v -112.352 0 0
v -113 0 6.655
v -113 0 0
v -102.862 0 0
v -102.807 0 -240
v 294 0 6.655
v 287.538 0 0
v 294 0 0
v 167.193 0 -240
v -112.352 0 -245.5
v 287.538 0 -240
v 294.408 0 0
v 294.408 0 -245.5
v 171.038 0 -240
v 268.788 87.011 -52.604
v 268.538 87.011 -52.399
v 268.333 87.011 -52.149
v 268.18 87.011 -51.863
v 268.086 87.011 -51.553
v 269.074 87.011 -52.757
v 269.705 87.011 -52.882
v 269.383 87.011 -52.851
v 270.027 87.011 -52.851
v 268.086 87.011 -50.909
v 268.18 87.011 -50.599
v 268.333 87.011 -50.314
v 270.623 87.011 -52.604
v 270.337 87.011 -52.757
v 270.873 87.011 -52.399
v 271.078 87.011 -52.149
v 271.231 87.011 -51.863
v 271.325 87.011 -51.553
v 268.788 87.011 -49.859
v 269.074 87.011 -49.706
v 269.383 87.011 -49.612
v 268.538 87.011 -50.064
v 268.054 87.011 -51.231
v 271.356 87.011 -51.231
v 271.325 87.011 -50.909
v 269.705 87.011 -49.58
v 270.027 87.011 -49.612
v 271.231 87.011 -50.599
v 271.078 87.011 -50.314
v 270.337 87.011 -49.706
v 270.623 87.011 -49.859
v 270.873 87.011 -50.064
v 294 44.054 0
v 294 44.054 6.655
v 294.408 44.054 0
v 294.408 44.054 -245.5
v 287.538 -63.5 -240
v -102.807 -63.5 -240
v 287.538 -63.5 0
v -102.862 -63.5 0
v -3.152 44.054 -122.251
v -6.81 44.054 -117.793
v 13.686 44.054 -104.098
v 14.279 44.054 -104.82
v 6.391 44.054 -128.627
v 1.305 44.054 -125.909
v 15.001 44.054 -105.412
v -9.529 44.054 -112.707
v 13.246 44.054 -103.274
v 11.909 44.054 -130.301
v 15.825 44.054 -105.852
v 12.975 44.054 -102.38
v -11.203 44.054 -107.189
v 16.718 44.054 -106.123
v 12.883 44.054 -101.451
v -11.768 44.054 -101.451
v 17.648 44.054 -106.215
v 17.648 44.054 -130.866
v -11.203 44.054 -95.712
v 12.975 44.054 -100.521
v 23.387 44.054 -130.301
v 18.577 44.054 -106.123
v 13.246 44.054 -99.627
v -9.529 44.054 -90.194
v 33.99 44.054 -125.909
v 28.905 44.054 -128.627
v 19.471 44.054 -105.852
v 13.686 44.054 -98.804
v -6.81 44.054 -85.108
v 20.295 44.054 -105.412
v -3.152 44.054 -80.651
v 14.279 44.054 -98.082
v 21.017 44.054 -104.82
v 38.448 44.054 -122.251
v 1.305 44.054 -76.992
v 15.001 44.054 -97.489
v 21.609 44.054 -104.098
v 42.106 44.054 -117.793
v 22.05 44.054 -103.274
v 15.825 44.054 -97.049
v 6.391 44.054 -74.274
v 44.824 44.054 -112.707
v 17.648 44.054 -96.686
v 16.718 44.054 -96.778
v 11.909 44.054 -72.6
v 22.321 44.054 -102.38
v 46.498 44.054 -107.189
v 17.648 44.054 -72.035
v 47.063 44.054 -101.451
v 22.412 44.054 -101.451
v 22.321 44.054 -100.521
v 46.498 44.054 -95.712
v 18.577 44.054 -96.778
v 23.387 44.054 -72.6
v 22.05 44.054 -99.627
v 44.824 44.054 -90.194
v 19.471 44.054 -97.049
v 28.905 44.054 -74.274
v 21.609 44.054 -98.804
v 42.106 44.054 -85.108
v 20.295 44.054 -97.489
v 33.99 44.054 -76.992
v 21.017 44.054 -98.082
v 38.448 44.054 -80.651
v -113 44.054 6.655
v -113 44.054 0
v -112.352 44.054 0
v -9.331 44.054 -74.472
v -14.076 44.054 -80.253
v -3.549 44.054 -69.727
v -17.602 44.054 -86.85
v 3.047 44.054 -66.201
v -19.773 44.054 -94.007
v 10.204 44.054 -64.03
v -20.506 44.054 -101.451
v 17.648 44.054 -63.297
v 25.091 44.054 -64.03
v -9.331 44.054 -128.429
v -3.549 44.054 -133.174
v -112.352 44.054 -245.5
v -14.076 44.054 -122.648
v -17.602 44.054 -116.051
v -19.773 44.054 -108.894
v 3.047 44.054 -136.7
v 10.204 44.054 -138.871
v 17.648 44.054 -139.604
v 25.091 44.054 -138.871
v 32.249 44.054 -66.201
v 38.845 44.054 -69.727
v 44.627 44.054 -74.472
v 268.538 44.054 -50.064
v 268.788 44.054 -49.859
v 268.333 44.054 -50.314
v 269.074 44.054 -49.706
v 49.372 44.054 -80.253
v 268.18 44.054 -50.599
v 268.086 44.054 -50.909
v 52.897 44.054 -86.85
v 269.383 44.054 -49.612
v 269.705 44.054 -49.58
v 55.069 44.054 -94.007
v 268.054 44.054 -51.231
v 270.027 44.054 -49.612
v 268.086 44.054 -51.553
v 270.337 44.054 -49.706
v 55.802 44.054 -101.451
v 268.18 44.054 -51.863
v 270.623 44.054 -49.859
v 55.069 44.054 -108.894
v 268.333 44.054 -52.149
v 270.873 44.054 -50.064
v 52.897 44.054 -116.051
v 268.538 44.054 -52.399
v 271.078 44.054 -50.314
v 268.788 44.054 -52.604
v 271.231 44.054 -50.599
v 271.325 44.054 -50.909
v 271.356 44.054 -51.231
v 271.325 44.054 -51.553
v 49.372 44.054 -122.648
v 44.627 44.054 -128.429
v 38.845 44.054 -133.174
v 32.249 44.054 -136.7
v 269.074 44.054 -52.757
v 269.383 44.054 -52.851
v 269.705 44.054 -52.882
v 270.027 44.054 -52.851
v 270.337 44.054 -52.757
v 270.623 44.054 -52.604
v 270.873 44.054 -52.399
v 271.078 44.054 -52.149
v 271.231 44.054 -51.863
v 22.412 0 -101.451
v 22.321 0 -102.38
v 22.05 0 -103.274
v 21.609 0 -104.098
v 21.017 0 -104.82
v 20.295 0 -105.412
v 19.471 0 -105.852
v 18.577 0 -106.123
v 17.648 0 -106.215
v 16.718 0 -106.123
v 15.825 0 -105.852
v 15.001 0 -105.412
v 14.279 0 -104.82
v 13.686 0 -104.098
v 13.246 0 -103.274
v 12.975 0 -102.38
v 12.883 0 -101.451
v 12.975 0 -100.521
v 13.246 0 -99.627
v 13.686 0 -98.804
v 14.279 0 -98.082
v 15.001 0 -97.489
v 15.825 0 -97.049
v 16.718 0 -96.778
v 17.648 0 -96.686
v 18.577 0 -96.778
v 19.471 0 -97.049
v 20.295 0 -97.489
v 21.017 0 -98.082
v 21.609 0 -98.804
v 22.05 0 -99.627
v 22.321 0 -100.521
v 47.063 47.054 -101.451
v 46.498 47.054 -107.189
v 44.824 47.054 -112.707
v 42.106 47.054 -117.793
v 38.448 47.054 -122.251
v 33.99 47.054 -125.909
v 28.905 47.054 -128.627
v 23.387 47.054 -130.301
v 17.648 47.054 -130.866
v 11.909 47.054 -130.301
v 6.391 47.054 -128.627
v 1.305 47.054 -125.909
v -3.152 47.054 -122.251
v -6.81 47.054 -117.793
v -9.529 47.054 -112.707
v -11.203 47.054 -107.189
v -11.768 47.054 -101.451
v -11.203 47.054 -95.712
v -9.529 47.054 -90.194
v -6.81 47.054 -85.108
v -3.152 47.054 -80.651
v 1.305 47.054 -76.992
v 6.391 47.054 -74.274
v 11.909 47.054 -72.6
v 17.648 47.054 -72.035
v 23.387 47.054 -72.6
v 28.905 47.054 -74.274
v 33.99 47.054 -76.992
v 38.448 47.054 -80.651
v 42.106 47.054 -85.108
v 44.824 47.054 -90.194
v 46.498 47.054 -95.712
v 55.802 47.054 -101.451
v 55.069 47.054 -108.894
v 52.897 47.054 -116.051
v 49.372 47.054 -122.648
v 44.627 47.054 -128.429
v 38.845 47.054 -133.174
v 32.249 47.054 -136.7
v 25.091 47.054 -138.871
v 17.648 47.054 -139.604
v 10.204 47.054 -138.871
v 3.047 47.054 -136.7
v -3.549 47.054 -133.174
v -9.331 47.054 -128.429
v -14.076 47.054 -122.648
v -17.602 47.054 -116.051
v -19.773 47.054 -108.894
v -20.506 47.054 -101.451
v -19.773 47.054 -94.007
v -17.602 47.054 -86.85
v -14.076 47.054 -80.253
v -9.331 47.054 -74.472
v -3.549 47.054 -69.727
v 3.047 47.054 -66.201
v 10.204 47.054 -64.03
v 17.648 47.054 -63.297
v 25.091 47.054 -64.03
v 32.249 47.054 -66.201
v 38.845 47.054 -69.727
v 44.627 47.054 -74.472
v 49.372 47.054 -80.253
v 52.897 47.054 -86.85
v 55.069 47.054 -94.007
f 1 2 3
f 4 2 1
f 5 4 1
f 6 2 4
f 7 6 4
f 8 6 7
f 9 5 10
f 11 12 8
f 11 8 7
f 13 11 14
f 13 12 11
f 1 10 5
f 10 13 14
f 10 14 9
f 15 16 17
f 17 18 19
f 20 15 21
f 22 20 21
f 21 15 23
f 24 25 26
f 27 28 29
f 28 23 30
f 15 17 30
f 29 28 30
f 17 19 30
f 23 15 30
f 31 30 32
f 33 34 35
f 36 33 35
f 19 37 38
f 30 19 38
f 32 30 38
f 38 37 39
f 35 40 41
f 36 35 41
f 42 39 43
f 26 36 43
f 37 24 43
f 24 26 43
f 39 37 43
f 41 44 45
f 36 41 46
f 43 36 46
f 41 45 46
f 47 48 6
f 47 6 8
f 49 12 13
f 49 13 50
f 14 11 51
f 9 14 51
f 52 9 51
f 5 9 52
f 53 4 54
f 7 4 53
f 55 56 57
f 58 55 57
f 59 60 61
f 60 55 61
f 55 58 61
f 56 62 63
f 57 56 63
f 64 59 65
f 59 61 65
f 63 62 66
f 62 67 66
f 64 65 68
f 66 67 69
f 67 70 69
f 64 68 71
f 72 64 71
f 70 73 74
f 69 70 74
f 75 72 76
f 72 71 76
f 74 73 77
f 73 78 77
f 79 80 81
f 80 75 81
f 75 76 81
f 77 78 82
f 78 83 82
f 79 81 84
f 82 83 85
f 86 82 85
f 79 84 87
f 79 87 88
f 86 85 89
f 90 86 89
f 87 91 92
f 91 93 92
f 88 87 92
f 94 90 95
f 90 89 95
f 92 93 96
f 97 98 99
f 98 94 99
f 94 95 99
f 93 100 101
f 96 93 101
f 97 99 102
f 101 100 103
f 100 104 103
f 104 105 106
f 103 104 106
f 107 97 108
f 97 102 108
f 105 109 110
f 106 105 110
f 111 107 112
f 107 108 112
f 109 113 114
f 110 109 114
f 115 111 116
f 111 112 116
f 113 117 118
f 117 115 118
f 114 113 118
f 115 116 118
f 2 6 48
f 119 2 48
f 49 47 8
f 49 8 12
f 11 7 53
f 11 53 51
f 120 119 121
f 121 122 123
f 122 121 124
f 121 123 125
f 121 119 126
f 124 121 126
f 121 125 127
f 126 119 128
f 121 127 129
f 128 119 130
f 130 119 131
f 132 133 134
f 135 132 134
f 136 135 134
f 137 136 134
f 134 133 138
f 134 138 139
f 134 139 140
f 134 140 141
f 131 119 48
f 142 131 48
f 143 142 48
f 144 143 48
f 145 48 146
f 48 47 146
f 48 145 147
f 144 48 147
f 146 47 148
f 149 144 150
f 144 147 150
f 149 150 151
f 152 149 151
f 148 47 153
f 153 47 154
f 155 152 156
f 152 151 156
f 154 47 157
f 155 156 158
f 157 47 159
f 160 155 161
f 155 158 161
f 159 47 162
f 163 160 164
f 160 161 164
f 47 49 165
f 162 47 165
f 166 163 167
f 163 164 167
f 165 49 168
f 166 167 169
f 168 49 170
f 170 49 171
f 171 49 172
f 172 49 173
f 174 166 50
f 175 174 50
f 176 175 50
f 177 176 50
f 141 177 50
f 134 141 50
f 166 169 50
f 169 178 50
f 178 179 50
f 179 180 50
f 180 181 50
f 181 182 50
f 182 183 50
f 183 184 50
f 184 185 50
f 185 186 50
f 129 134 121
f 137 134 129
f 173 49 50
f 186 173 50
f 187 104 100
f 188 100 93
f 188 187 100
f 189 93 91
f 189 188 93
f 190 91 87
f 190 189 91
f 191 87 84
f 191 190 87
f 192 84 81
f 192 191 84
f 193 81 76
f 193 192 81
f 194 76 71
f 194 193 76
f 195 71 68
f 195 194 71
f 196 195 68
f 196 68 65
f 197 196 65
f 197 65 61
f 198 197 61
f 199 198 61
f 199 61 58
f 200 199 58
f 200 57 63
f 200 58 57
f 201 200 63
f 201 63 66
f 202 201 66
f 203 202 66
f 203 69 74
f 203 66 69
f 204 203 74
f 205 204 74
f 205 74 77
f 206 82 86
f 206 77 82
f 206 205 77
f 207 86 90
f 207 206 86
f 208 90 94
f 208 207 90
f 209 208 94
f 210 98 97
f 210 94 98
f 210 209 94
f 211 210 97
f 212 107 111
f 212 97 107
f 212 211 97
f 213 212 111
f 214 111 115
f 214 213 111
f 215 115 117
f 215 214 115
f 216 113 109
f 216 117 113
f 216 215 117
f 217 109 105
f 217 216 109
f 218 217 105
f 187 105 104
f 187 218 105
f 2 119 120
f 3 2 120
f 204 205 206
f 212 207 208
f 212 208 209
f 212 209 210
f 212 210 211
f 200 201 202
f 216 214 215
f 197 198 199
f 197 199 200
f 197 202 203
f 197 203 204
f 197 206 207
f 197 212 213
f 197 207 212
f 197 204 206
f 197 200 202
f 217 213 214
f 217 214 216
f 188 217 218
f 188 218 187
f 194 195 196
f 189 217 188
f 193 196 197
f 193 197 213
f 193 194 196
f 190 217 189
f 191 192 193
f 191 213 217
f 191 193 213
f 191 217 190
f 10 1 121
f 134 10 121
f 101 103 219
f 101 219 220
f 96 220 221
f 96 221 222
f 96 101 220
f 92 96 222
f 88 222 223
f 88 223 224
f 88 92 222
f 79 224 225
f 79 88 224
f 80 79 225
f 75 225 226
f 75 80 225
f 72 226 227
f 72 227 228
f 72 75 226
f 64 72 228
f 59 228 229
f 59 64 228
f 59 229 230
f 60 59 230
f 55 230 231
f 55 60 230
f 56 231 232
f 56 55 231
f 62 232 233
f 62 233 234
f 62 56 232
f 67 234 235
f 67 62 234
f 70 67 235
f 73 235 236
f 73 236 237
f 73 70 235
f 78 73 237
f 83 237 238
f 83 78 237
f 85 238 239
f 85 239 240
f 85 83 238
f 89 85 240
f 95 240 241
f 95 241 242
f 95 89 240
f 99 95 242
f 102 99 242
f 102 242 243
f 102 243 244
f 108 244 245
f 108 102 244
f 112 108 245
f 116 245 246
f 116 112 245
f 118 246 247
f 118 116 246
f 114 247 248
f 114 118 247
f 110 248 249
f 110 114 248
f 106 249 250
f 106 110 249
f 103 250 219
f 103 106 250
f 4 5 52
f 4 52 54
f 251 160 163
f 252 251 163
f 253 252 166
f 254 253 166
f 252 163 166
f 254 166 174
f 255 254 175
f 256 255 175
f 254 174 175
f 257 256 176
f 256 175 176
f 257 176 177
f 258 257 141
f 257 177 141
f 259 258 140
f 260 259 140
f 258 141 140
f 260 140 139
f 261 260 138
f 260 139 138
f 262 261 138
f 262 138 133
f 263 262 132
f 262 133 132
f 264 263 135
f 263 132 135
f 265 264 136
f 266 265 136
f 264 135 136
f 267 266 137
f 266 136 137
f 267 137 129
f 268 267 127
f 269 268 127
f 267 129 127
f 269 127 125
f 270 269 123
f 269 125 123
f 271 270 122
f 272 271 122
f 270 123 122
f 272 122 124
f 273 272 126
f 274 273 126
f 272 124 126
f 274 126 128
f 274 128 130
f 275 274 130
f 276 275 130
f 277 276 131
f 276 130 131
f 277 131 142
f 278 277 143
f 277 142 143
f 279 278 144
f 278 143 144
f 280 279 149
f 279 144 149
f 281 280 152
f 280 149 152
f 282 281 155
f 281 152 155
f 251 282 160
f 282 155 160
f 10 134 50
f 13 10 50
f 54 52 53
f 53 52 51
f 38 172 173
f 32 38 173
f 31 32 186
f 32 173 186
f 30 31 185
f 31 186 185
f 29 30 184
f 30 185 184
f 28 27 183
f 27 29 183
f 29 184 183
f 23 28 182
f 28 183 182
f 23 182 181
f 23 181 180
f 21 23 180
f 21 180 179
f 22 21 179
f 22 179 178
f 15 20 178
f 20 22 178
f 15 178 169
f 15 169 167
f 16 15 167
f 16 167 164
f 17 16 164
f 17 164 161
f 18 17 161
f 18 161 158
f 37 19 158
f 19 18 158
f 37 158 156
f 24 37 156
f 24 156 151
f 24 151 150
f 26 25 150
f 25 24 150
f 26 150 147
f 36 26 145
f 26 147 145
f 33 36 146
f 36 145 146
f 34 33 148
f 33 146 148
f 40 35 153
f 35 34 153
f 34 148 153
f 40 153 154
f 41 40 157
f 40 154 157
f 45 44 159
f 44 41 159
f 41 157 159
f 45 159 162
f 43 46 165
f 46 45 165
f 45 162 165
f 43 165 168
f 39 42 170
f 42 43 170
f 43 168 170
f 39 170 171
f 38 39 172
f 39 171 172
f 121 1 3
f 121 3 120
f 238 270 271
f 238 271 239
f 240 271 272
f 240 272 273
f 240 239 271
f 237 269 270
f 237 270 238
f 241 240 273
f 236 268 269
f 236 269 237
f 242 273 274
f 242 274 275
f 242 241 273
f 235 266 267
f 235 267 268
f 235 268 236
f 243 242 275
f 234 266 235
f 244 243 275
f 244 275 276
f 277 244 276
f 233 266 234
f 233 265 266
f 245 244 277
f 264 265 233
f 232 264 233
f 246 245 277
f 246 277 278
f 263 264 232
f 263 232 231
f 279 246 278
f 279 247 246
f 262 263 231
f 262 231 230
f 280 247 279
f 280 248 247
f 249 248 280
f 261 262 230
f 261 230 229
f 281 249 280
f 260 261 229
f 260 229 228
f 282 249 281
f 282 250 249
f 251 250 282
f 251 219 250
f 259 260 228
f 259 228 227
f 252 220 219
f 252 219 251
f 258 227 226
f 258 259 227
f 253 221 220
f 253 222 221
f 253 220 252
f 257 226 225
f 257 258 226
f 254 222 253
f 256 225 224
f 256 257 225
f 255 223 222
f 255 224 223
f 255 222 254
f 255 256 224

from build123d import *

# Parameters (mm, degrees)
CROQUIS1_W                   = 270
CROQUIS1_H                   = 240
SALIENTE_EXTRUIR1_DEPTH      = 30
CROQUIS1_W_2                 = 116.5
SALIENTE_EXTRUIR1_2_DEPTH    = 30
SALIENTE_EXTRUIR3_DEPTH      = 63.5
CROQUIS3_W                   = 406.759820342
CROQUIS3_H                   = 44.054315541
SALIENTE_EXTRUIR4_DEPTH      = 245.5
CROQUIS4_R                   = 38.153863336
CROQUIS4_R_2                 = 29.41561916
SALIENTE_EXTRUIR5_DEPTH      = 3
CROQUIS5_R                   = 4.7645
CORTAR_EXTRUIR1_DEPTH        = 142
CROQUIS6_W                   = 6.655343447
CROQUIS6_H                   = 44.054315541
SALIENTE_EXTRUIR6_DEPTH      = 294
SALIENTE_EXTRUIR6_DEPTH_BACK = 113
CROQUIS7_R                   = 1.651
SALIENTE_EXTRUIR8_DEPTH      = 112
SALIENTE_EXTRUIR8_DEPTH_BACK = 2
CROQUIS8_W                   = 3.302
CROQUIS8_H                   = 24.988896413
CORTAR_EXTRUIR2_DEPTH        = 112


with BuildPart() as part:
    # Croquis1 → Saliente-Extruir1 (new body)
    with BuildSketch(Plane(origin=(0, 0, 0), x_dir=(1, 0, 0), z_dir=(0, 1, 0))):
        with Locations((32.193078438, 120)):
            Rectangle(CROQUIS1_W, CROQUIS1_H)
    extrude(amount=SALIENTE_EXTRUIR1_DEPTH)



with BuildPart() as body_2:
    # Croquis1 → Saliente-Extruir1 2 (new body)
    with BuildSketch(Plane(origin=(0, 0, 0), x_dir=(1, 0, 0), z_dir=(0, 1, 0))):
        with Locations((229.288362697, 120)):
            Rectangle(CROQUIS1_W_2, CROQUIS1_H)
    extrude(amount=SALIENTE_EXTRUIR1_2_DEPTH)


with BuildPart() as part_1:
    add(part.part)

    add(body_2.part)  # Saliente-Extruir3 merges body 2
    # Croquis2 → Saliente-Extruir3 (add)
    with BuildSketch(Plane(origin=(0, 0, 0), x_dir=(1, 0, 0), z_dir=(0, 1, 0))):
        Polygon((-102.861944812, 0), (287.538362697, 0), (287.538362697, 240), (-102.806921562, 240), align=None)
    extrude(amount=-SALIENTE_EXTRUIR3_DEPTH)

    # Croquis3 → Saliente-Extruir4 (add)
    with BuildSketch(Plane.XY):
        with Locations((91.027758877, 22.027157771)):
            Rectangle(CROQUIS3_W, CROQUIS3_H)
    extrude(amount=-SALIENTE_EXTRUIR4_DEPTH)

    # Croquis4 → Saliente-Extruir5 (add)
    with BuildSketch(Plane(origin=(0, 44.054315541, 0), x_dir=(1, 0, 0), z_dir=(0, 1, 0))):
        with Locations((17.647848706, 101.450529821)):
            Circle(CROQUIS4_R)
        with Locations((17.647848706, 101.450529821)):
            Circle(CROQUIS4_R_2, mode=Mode.SUBTRACT)
    extrude(amount=SALIENTE_EXTRUIR5_DEPTH)

    # Croquis5 → Cortar-Extruir1 (cut)
    with BuildSketch(Plane(origin=(0, 0, 0), x_dir=(1, 0, 0), z_dir=(0, 1, 0))):
        with Locations((17.647848706, 101.450529821)):
            Circle(CROQUIS5_R)
    extrude(amount=CORTAR_EXTRUIR1_DEPTH, mode=Mode.SUBTRACT)

    # Croquis6 → Saliente-Extruir6 (add, two sides)
    with BuildSketch(Plane(origin=(0, 0, 0), x_dir=(0, 0, -1), z_dir=(1, 0, 0))) as saliente_extruir6_sk:
        with Locations((-3.327671724, 22.027157771)):
            Rectangle(CROQUIS6_W, CROQUIS6_H)
    extrude(amount=SALIENTE_EXTRUIR6_DEPTH)
    extrude(saliente_extruir6_sk.sketch, amount=-SALIENTE_EXTRUIR6_DEPTH_BACK)

    # Croquis7 → Saliente-Extruir8 (add, two sides)
    with BuildSketch(Plane(origin=(0, 0, 0), x_dir=(1, 0, 0), z_dir=(0, 1, 0))) as saliente_extruir8_sk:
        with Locations((269.705344772, 51.231276753)):
            Circle(CROQUIS7_R)
    extrude(amount=SALIENTE_EXTRUIR8_DEPTH)
    extrude(saliente_extruir8_sk.sketch, amount=-SALIENTE_EXTRUIR8_DEPTH_BACK)

    # Croquis8 → Cortar-Extruir2 (cut)
    with BuildSketch(Plane.XY):
        with Locations((269.705344772, 99.505551794)):
            Rectangle(CROQUIS8_W, CROQUIS8_H)
    extrude(amount=-CORTAR_EXTRUIR2_DEPTH, mode=Mode.SUBTRACT)


solid = part_1.part
